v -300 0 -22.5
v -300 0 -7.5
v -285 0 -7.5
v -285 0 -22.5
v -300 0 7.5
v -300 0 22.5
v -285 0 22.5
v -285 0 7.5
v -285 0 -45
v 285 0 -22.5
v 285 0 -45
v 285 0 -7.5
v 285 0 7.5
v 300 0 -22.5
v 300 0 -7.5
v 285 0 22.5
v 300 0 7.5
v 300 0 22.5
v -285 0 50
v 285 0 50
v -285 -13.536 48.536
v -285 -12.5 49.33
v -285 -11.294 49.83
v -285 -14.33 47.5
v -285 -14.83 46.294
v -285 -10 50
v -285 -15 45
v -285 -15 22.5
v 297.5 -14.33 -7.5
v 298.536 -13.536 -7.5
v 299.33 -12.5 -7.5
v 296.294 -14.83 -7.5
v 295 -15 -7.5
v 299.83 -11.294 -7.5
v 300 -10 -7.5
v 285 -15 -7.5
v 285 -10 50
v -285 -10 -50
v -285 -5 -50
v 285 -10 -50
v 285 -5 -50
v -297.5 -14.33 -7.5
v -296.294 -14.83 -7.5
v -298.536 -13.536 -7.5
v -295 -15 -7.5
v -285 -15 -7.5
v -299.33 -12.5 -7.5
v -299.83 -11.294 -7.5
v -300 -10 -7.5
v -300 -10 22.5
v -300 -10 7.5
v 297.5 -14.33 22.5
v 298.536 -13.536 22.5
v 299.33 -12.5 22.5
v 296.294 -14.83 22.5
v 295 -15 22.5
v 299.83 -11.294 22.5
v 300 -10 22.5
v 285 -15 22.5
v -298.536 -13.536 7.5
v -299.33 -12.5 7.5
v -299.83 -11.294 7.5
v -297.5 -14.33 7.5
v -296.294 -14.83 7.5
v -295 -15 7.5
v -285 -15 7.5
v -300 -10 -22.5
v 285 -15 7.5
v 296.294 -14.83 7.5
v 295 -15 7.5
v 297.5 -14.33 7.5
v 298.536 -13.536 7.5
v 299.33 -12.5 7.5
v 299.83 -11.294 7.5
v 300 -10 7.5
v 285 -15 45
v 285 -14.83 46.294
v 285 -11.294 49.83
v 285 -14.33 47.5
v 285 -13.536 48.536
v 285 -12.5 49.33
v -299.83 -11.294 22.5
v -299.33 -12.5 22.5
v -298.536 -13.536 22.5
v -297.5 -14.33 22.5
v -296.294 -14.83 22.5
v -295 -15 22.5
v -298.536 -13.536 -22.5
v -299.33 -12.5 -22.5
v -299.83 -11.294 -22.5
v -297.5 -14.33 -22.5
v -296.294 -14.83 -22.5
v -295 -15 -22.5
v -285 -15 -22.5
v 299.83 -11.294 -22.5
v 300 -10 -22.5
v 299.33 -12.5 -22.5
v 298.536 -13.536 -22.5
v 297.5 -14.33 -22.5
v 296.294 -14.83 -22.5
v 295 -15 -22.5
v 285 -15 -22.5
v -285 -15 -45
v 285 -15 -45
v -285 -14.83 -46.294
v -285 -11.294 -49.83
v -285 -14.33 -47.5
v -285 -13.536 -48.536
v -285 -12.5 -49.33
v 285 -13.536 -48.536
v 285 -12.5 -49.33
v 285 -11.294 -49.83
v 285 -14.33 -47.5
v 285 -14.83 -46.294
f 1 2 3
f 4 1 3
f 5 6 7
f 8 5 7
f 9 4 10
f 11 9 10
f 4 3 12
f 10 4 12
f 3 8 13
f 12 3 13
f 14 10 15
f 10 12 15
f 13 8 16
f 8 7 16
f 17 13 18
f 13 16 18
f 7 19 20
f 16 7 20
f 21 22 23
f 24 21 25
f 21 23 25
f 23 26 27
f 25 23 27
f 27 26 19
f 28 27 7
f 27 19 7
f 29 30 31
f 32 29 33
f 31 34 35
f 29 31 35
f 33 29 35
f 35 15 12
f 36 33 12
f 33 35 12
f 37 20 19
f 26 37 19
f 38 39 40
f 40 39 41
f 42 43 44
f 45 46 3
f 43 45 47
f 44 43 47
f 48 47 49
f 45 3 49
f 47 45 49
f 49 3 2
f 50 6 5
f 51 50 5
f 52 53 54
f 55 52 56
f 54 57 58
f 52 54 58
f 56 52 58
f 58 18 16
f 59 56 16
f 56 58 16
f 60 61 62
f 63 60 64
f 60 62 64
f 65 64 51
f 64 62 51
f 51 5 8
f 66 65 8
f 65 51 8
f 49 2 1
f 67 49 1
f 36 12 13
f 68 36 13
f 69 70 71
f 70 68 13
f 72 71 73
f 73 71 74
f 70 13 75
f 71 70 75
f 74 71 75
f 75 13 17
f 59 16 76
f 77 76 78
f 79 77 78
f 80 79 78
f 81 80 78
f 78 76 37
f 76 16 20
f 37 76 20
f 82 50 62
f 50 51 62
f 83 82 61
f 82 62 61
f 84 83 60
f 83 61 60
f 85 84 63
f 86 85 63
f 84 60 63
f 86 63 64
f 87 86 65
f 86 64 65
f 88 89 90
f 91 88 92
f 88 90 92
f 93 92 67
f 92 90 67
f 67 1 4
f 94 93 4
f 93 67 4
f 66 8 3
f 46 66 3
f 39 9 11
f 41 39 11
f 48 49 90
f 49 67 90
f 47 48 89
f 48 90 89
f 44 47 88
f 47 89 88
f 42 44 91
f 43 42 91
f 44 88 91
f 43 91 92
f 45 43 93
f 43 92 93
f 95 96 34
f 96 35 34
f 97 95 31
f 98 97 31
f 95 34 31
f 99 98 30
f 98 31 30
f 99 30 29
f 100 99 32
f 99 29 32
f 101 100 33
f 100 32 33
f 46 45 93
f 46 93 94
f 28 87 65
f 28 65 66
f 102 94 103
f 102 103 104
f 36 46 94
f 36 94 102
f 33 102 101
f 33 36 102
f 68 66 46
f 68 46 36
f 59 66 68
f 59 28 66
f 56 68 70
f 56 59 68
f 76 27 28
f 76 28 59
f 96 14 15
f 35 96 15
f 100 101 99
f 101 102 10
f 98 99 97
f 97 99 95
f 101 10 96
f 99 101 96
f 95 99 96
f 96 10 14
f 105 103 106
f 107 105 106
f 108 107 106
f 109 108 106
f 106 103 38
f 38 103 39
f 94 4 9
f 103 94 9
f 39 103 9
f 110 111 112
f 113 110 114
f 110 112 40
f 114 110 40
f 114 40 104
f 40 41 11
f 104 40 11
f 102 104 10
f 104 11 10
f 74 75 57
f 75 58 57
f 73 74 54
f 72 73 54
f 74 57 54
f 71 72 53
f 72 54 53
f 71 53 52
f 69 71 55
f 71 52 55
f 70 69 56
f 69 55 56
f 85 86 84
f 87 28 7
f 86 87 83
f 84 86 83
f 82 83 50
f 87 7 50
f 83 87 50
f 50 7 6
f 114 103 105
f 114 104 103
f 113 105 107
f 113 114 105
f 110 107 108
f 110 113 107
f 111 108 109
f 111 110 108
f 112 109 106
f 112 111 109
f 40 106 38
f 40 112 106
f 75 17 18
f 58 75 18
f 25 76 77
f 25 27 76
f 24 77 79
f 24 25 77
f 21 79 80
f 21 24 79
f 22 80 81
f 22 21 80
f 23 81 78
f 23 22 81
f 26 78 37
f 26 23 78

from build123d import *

# Parameters (mm, degrees)
F1_DEPTH = 15
F2_R     = 5
F3_R     = 5
F4_SIZE  = 5


with BuildPart() as f1:
    # F0 (on Front) → F1 (new body)
    with BuildSketch(Plane.XZ):
        Polygon((-300, -22.5), (-285, -22.5), (-285, -50), (0, -50), (285, -50), (285, -22.5), (300, -22.5), (300, -7.5), (285, -7.5), (285, 7.5), (300, 7.5), (300, 22.5), (285, 22.5), (285, 50), (0, 50), (-285, 50), (-285, 22.5), (-300, 22.5), (-300, 7.5), (-285, 7.5), (-285, -7.5), (-300, -7.5), align=None)
    extrude(amount=F1_DEPTH)

    # F2
    f2_edges = [f1.edges().sort_by_distance(p)[0] for p in [
        (300, -15, 15),
        (300, -15, -15),
        (-300, -15, -15),
        (-300, -15, 15),
    ]]
    fillet(f2_edges, radius=F2_R)

    # F3
    f3_edges = [f1.edges().sort_by_distance(p)[0] for p in [
        (0, -15, 50),
        (0, -15, -50),
    ]]
    fillet(f3_edges, radius=F3_R)

    # F4
    f4_edges = [f1.edges().sort_by_distance(p)[0] for p in [
        (0, 0, -50),
    ]]
    chamfer(f4_edges, length=F4_SIZE)


solid = f1.part
